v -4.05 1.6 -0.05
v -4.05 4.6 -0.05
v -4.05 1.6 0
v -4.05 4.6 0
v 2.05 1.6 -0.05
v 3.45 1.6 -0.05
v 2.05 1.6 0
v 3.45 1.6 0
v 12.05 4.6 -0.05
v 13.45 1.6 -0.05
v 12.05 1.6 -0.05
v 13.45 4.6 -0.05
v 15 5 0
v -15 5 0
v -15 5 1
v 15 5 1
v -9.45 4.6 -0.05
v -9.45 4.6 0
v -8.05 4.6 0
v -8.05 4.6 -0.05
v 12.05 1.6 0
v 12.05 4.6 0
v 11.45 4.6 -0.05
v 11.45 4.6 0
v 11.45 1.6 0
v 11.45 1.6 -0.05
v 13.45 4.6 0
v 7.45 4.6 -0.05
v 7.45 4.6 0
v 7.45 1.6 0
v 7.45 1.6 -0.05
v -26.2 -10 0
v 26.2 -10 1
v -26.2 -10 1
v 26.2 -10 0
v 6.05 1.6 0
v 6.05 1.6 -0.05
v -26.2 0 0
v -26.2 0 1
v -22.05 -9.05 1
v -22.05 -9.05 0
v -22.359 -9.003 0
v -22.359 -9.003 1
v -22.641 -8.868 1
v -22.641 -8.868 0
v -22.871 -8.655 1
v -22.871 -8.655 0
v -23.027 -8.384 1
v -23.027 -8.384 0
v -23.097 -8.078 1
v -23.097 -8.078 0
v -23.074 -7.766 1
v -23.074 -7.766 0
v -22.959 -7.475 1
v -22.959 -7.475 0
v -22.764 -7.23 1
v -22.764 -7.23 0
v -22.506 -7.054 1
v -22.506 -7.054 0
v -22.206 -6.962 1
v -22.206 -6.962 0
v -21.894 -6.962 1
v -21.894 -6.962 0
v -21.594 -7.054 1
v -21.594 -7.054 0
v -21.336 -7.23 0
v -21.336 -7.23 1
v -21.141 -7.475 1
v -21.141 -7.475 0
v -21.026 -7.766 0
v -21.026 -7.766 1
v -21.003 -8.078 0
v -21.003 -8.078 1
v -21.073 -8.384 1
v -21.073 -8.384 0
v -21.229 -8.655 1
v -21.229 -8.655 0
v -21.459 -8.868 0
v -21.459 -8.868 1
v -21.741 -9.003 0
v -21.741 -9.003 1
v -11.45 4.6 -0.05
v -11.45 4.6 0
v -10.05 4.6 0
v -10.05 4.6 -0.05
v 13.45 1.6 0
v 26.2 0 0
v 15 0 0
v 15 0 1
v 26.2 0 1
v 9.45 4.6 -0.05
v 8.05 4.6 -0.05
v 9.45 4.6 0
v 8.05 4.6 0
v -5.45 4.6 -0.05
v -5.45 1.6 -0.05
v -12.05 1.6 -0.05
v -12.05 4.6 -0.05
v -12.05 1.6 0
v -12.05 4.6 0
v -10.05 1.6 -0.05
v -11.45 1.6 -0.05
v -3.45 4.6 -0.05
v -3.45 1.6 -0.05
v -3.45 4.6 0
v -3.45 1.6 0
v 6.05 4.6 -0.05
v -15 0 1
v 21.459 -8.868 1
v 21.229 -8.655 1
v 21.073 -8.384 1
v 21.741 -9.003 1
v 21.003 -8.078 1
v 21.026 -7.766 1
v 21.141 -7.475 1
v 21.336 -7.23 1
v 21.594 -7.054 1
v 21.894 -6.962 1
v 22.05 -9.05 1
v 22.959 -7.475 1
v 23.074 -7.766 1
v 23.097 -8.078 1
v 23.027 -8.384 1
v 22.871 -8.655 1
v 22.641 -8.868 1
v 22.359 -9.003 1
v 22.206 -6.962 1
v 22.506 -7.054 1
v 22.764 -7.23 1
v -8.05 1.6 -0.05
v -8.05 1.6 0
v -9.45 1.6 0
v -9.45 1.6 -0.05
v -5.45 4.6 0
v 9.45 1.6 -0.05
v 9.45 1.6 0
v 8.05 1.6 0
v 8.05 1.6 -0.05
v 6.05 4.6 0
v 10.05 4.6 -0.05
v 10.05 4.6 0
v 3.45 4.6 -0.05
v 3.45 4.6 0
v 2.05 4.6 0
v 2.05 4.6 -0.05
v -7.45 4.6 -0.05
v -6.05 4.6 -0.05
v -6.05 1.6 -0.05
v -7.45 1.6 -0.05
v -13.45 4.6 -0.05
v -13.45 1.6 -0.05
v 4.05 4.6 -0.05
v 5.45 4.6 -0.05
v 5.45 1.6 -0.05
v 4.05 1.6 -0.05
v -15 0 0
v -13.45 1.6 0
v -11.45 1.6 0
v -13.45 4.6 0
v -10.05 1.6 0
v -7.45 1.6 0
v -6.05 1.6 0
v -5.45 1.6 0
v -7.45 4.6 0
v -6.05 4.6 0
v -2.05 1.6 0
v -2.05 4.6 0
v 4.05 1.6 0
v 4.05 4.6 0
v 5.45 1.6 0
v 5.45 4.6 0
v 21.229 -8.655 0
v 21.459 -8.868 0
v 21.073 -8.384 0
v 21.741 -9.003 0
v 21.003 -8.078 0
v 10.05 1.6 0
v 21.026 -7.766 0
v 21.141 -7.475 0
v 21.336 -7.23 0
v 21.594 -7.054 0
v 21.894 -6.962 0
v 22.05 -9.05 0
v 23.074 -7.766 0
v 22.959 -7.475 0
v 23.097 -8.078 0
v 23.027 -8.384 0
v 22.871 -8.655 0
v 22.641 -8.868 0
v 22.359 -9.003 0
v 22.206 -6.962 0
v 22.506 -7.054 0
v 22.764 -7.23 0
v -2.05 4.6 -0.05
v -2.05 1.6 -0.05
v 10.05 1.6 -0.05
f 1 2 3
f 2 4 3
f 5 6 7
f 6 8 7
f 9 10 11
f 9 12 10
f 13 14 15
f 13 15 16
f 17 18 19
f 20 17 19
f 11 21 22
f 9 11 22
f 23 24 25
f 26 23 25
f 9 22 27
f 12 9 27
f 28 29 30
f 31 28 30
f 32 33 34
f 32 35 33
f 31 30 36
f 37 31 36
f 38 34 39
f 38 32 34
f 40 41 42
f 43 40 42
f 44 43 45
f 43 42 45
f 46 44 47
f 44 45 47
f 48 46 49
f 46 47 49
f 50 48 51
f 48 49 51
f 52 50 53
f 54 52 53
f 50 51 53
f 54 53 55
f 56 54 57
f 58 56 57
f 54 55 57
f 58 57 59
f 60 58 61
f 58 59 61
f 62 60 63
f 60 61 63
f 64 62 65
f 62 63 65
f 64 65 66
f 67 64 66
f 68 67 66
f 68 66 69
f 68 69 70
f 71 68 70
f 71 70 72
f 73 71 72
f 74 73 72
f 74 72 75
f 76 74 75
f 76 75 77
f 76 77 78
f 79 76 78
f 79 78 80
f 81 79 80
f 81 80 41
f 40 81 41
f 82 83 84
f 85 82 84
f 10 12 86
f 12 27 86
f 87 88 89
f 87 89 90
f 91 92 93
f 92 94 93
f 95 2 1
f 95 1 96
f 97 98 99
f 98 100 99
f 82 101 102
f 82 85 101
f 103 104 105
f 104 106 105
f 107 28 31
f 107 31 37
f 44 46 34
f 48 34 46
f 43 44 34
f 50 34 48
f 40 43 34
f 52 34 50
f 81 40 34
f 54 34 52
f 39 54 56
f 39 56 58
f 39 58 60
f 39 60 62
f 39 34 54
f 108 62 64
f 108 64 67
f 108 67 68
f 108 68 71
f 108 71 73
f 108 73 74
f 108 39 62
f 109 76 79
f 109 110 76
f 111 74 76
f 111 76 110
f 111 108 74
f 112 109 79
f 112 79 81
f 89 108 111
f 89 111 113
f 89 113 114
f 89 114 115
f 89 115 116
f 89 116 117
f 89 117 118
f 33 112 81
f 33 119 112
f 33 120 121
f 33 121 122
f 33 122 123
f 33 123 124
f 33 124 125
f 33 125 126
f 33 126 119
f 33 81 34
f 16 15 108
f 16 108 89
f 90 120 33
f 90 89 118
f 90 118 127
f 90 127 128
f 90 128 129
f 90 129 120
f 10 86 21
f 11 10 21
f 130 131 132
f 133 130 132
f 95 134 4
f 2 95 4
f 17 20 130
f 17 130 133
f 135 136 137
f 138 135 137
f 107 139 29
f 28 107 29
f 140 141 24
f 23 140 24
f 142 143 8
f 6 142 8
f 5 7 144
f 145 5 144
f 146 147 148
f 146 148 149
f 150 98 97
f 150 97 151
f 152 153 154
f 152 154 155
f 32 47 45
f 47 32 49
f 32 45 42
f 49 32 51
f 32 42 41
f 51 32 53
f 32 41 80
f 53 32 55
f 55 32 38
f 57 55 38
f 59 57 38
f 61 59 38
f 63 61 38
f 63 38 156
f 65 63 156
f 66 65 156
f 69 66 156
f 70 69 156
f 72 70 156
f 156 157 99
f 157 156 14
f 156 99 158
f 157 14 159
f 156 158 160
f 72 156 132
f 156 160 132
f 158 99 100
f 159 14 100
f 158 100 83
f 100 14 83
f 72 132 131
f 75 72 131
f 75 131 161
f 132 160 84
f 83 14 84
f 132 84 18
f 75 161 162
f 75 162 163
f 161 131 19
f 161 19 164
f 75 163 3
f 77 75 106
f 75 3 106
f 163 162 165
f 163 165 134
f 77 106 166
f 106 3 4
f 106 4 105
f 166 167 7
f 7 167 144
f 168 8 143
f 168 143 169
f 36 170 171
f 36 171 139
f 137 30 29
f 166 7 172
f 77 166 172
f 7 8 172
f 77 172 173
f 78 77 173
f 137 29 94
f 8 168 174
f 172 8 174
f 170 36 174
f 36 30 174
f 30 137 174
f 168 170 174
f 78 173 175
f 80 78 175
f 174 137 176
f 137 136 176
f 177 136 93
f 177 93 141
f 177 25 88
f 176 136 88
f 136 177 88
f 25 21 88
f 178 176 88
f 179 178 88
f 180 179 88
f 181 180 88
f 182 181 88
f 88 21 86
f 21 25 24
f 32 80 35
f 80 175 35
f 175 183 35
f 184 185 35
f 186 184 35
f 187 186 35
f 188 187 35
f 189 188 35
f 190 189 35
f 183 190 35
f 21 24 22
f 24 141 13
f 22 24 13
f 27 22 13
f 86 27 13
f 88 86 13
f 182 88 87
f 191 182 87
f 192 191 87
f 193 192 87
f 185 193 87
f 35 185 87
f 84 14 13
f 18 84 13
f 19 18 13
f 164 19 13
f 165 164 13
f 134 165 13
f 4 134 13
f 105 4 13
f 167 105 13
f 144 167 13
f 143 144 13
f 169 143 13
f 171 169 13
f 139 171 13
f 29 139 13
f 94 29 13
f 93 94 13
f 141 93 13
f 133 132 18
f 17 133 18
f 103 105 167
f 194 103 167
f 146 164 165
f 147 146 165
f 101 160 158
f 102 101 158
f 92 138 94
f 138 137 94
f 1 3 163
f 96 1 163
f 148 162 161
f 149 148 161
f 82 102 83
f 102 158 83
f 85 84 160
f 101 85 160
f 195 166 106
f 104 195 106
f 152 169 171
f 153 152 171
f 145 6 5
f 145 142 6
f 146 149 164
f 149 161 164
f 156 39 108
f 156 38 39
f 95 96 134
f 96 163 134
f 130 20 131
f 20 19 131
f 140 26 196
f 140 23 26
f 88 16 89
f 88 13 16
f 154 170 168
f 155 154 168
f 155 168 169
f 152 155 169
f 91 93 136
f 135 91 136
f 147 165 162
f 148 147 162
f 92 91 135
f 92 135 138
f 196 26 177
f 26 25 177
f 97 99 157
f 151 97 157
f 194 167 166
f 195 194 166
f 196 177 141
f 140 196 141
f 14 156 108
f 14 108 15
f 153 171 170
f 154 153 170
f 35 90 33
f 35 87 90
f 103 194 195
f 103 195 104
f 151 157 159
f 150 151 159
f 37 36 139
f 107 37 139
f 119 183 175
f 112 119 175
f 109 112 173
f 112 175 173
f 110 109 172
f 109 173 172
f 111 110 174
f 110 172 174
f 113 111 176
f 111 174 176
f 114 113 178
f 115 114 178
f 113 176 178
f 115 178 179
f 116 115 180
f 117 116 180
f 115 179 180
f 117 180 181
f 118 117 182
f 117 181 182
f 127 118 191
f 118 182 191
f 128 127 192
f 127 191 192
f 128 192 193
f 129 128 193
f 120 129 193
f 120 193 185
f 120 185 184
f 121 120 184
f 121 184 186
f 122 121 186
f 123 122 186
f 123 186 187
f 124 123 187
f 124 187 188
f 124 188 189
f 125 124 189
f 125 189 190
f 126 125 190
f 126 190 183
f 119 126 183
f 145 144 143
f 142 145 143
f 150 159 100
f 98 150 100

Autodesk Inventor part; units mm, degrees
ref_plane "YZ Plane" through (0, 0, 0) normal (1, 0, 0) x (0, 1, 0)
ref_plane "XZ Plane" through (0, 0, 0) normal (0, 1, 0) x (-1, 0, 0)
ref_plane "XY Plane" through (0, 0, 0) normal (0, 0, 1) x (1, 0, 0)
sketch "Skizze1" plane through (0, 0, 0) normal (0, 0, 1) x (1, 0, 0)
  line L0 (-15, 5) -> (15, 5)
  line L1 (15, 5) -> (15, 0)
  line L2 (-15, 0) -> (-15, 5)
  line L3 (26.2, 0) -> (26.2, -10)
  line L4 (26.2, -10) -> (-26.2, -10)
  line L5 (-26.2, -10) -> (-26.2, 0)
  line L6 (-26.2, 0) -> (-15, 0)
  line L7 (15, 0) -> (26.2, 0)
  line L8 (0, 8) -> (0, -13) projected
  point P0 (0, 0)
  dimension "d0" = 30
  dimension "d1" = 5
  dimension "d2" = 52.4
  dimension "d3" = 10
extrude "Extrusion1" add sketch "Skizze1" along normal blind 1
sketch "Skizze3" plane through (0, 0, 1) normal (0, 0, 1) x (1, 0, 0)
  line L0 (0, 8) -> (0, -13) projected
  line L1 (-36.68, 0) -> (36.68, 0) projected
  point P0 (0, 0)
  point P1 (22.05, -8)
  point P2 (-22.05, -8)
  dimension "d18" = 22.05
  dimension "d19" = 8
hole "Bohrung2" at (22.05, -8, 1) at (-22.05, -8, 1) direction (0, 0, -1) diameter 2.1 end through all
sketch "Skizze4" plane through (0, 0, 0) normal (0, 0, -1) x (-1, 0, 0)
  line L0 (-2.05, 4.6) -> (-3.45, 4.6)
  line L1 (-3.45, 4.6) -> (-3.45, 1.6)
  line L2 (-3.45, 1.6) -> (-2.05, 1.6)
  line L3 (-2.05, 1.6) -> (-2.05, 4.6)
  line L4 (15, 5) -> (-15, 5) projected
  line L5 (0, -13) -> (0, 8) projected
  line L6 (-2.75, 4.6) -> (-2.75, 1.6) construction
  point P0 (0, 0)
  dimension "d27" = 1.4
  dimension "d28" = 0.4
  dimension "d29" = 3
  dimension "d31" = 2.75
extrude "Extrusion2" add sketch "Skizze4" along normal blind 0.05
pattern_linear "Rechteckige Anordnung2" count 6 spacing 2 along (1, 0, 0) of "Extrusion2"
mirror "Spiegeln2" about plane through (0, 0, 0) normal (1, 0, 0) of "Extrusion2", "Rechteckige Anordnung2"
properties part number "Ballsensor IR Platine" material "Phenolharz"
